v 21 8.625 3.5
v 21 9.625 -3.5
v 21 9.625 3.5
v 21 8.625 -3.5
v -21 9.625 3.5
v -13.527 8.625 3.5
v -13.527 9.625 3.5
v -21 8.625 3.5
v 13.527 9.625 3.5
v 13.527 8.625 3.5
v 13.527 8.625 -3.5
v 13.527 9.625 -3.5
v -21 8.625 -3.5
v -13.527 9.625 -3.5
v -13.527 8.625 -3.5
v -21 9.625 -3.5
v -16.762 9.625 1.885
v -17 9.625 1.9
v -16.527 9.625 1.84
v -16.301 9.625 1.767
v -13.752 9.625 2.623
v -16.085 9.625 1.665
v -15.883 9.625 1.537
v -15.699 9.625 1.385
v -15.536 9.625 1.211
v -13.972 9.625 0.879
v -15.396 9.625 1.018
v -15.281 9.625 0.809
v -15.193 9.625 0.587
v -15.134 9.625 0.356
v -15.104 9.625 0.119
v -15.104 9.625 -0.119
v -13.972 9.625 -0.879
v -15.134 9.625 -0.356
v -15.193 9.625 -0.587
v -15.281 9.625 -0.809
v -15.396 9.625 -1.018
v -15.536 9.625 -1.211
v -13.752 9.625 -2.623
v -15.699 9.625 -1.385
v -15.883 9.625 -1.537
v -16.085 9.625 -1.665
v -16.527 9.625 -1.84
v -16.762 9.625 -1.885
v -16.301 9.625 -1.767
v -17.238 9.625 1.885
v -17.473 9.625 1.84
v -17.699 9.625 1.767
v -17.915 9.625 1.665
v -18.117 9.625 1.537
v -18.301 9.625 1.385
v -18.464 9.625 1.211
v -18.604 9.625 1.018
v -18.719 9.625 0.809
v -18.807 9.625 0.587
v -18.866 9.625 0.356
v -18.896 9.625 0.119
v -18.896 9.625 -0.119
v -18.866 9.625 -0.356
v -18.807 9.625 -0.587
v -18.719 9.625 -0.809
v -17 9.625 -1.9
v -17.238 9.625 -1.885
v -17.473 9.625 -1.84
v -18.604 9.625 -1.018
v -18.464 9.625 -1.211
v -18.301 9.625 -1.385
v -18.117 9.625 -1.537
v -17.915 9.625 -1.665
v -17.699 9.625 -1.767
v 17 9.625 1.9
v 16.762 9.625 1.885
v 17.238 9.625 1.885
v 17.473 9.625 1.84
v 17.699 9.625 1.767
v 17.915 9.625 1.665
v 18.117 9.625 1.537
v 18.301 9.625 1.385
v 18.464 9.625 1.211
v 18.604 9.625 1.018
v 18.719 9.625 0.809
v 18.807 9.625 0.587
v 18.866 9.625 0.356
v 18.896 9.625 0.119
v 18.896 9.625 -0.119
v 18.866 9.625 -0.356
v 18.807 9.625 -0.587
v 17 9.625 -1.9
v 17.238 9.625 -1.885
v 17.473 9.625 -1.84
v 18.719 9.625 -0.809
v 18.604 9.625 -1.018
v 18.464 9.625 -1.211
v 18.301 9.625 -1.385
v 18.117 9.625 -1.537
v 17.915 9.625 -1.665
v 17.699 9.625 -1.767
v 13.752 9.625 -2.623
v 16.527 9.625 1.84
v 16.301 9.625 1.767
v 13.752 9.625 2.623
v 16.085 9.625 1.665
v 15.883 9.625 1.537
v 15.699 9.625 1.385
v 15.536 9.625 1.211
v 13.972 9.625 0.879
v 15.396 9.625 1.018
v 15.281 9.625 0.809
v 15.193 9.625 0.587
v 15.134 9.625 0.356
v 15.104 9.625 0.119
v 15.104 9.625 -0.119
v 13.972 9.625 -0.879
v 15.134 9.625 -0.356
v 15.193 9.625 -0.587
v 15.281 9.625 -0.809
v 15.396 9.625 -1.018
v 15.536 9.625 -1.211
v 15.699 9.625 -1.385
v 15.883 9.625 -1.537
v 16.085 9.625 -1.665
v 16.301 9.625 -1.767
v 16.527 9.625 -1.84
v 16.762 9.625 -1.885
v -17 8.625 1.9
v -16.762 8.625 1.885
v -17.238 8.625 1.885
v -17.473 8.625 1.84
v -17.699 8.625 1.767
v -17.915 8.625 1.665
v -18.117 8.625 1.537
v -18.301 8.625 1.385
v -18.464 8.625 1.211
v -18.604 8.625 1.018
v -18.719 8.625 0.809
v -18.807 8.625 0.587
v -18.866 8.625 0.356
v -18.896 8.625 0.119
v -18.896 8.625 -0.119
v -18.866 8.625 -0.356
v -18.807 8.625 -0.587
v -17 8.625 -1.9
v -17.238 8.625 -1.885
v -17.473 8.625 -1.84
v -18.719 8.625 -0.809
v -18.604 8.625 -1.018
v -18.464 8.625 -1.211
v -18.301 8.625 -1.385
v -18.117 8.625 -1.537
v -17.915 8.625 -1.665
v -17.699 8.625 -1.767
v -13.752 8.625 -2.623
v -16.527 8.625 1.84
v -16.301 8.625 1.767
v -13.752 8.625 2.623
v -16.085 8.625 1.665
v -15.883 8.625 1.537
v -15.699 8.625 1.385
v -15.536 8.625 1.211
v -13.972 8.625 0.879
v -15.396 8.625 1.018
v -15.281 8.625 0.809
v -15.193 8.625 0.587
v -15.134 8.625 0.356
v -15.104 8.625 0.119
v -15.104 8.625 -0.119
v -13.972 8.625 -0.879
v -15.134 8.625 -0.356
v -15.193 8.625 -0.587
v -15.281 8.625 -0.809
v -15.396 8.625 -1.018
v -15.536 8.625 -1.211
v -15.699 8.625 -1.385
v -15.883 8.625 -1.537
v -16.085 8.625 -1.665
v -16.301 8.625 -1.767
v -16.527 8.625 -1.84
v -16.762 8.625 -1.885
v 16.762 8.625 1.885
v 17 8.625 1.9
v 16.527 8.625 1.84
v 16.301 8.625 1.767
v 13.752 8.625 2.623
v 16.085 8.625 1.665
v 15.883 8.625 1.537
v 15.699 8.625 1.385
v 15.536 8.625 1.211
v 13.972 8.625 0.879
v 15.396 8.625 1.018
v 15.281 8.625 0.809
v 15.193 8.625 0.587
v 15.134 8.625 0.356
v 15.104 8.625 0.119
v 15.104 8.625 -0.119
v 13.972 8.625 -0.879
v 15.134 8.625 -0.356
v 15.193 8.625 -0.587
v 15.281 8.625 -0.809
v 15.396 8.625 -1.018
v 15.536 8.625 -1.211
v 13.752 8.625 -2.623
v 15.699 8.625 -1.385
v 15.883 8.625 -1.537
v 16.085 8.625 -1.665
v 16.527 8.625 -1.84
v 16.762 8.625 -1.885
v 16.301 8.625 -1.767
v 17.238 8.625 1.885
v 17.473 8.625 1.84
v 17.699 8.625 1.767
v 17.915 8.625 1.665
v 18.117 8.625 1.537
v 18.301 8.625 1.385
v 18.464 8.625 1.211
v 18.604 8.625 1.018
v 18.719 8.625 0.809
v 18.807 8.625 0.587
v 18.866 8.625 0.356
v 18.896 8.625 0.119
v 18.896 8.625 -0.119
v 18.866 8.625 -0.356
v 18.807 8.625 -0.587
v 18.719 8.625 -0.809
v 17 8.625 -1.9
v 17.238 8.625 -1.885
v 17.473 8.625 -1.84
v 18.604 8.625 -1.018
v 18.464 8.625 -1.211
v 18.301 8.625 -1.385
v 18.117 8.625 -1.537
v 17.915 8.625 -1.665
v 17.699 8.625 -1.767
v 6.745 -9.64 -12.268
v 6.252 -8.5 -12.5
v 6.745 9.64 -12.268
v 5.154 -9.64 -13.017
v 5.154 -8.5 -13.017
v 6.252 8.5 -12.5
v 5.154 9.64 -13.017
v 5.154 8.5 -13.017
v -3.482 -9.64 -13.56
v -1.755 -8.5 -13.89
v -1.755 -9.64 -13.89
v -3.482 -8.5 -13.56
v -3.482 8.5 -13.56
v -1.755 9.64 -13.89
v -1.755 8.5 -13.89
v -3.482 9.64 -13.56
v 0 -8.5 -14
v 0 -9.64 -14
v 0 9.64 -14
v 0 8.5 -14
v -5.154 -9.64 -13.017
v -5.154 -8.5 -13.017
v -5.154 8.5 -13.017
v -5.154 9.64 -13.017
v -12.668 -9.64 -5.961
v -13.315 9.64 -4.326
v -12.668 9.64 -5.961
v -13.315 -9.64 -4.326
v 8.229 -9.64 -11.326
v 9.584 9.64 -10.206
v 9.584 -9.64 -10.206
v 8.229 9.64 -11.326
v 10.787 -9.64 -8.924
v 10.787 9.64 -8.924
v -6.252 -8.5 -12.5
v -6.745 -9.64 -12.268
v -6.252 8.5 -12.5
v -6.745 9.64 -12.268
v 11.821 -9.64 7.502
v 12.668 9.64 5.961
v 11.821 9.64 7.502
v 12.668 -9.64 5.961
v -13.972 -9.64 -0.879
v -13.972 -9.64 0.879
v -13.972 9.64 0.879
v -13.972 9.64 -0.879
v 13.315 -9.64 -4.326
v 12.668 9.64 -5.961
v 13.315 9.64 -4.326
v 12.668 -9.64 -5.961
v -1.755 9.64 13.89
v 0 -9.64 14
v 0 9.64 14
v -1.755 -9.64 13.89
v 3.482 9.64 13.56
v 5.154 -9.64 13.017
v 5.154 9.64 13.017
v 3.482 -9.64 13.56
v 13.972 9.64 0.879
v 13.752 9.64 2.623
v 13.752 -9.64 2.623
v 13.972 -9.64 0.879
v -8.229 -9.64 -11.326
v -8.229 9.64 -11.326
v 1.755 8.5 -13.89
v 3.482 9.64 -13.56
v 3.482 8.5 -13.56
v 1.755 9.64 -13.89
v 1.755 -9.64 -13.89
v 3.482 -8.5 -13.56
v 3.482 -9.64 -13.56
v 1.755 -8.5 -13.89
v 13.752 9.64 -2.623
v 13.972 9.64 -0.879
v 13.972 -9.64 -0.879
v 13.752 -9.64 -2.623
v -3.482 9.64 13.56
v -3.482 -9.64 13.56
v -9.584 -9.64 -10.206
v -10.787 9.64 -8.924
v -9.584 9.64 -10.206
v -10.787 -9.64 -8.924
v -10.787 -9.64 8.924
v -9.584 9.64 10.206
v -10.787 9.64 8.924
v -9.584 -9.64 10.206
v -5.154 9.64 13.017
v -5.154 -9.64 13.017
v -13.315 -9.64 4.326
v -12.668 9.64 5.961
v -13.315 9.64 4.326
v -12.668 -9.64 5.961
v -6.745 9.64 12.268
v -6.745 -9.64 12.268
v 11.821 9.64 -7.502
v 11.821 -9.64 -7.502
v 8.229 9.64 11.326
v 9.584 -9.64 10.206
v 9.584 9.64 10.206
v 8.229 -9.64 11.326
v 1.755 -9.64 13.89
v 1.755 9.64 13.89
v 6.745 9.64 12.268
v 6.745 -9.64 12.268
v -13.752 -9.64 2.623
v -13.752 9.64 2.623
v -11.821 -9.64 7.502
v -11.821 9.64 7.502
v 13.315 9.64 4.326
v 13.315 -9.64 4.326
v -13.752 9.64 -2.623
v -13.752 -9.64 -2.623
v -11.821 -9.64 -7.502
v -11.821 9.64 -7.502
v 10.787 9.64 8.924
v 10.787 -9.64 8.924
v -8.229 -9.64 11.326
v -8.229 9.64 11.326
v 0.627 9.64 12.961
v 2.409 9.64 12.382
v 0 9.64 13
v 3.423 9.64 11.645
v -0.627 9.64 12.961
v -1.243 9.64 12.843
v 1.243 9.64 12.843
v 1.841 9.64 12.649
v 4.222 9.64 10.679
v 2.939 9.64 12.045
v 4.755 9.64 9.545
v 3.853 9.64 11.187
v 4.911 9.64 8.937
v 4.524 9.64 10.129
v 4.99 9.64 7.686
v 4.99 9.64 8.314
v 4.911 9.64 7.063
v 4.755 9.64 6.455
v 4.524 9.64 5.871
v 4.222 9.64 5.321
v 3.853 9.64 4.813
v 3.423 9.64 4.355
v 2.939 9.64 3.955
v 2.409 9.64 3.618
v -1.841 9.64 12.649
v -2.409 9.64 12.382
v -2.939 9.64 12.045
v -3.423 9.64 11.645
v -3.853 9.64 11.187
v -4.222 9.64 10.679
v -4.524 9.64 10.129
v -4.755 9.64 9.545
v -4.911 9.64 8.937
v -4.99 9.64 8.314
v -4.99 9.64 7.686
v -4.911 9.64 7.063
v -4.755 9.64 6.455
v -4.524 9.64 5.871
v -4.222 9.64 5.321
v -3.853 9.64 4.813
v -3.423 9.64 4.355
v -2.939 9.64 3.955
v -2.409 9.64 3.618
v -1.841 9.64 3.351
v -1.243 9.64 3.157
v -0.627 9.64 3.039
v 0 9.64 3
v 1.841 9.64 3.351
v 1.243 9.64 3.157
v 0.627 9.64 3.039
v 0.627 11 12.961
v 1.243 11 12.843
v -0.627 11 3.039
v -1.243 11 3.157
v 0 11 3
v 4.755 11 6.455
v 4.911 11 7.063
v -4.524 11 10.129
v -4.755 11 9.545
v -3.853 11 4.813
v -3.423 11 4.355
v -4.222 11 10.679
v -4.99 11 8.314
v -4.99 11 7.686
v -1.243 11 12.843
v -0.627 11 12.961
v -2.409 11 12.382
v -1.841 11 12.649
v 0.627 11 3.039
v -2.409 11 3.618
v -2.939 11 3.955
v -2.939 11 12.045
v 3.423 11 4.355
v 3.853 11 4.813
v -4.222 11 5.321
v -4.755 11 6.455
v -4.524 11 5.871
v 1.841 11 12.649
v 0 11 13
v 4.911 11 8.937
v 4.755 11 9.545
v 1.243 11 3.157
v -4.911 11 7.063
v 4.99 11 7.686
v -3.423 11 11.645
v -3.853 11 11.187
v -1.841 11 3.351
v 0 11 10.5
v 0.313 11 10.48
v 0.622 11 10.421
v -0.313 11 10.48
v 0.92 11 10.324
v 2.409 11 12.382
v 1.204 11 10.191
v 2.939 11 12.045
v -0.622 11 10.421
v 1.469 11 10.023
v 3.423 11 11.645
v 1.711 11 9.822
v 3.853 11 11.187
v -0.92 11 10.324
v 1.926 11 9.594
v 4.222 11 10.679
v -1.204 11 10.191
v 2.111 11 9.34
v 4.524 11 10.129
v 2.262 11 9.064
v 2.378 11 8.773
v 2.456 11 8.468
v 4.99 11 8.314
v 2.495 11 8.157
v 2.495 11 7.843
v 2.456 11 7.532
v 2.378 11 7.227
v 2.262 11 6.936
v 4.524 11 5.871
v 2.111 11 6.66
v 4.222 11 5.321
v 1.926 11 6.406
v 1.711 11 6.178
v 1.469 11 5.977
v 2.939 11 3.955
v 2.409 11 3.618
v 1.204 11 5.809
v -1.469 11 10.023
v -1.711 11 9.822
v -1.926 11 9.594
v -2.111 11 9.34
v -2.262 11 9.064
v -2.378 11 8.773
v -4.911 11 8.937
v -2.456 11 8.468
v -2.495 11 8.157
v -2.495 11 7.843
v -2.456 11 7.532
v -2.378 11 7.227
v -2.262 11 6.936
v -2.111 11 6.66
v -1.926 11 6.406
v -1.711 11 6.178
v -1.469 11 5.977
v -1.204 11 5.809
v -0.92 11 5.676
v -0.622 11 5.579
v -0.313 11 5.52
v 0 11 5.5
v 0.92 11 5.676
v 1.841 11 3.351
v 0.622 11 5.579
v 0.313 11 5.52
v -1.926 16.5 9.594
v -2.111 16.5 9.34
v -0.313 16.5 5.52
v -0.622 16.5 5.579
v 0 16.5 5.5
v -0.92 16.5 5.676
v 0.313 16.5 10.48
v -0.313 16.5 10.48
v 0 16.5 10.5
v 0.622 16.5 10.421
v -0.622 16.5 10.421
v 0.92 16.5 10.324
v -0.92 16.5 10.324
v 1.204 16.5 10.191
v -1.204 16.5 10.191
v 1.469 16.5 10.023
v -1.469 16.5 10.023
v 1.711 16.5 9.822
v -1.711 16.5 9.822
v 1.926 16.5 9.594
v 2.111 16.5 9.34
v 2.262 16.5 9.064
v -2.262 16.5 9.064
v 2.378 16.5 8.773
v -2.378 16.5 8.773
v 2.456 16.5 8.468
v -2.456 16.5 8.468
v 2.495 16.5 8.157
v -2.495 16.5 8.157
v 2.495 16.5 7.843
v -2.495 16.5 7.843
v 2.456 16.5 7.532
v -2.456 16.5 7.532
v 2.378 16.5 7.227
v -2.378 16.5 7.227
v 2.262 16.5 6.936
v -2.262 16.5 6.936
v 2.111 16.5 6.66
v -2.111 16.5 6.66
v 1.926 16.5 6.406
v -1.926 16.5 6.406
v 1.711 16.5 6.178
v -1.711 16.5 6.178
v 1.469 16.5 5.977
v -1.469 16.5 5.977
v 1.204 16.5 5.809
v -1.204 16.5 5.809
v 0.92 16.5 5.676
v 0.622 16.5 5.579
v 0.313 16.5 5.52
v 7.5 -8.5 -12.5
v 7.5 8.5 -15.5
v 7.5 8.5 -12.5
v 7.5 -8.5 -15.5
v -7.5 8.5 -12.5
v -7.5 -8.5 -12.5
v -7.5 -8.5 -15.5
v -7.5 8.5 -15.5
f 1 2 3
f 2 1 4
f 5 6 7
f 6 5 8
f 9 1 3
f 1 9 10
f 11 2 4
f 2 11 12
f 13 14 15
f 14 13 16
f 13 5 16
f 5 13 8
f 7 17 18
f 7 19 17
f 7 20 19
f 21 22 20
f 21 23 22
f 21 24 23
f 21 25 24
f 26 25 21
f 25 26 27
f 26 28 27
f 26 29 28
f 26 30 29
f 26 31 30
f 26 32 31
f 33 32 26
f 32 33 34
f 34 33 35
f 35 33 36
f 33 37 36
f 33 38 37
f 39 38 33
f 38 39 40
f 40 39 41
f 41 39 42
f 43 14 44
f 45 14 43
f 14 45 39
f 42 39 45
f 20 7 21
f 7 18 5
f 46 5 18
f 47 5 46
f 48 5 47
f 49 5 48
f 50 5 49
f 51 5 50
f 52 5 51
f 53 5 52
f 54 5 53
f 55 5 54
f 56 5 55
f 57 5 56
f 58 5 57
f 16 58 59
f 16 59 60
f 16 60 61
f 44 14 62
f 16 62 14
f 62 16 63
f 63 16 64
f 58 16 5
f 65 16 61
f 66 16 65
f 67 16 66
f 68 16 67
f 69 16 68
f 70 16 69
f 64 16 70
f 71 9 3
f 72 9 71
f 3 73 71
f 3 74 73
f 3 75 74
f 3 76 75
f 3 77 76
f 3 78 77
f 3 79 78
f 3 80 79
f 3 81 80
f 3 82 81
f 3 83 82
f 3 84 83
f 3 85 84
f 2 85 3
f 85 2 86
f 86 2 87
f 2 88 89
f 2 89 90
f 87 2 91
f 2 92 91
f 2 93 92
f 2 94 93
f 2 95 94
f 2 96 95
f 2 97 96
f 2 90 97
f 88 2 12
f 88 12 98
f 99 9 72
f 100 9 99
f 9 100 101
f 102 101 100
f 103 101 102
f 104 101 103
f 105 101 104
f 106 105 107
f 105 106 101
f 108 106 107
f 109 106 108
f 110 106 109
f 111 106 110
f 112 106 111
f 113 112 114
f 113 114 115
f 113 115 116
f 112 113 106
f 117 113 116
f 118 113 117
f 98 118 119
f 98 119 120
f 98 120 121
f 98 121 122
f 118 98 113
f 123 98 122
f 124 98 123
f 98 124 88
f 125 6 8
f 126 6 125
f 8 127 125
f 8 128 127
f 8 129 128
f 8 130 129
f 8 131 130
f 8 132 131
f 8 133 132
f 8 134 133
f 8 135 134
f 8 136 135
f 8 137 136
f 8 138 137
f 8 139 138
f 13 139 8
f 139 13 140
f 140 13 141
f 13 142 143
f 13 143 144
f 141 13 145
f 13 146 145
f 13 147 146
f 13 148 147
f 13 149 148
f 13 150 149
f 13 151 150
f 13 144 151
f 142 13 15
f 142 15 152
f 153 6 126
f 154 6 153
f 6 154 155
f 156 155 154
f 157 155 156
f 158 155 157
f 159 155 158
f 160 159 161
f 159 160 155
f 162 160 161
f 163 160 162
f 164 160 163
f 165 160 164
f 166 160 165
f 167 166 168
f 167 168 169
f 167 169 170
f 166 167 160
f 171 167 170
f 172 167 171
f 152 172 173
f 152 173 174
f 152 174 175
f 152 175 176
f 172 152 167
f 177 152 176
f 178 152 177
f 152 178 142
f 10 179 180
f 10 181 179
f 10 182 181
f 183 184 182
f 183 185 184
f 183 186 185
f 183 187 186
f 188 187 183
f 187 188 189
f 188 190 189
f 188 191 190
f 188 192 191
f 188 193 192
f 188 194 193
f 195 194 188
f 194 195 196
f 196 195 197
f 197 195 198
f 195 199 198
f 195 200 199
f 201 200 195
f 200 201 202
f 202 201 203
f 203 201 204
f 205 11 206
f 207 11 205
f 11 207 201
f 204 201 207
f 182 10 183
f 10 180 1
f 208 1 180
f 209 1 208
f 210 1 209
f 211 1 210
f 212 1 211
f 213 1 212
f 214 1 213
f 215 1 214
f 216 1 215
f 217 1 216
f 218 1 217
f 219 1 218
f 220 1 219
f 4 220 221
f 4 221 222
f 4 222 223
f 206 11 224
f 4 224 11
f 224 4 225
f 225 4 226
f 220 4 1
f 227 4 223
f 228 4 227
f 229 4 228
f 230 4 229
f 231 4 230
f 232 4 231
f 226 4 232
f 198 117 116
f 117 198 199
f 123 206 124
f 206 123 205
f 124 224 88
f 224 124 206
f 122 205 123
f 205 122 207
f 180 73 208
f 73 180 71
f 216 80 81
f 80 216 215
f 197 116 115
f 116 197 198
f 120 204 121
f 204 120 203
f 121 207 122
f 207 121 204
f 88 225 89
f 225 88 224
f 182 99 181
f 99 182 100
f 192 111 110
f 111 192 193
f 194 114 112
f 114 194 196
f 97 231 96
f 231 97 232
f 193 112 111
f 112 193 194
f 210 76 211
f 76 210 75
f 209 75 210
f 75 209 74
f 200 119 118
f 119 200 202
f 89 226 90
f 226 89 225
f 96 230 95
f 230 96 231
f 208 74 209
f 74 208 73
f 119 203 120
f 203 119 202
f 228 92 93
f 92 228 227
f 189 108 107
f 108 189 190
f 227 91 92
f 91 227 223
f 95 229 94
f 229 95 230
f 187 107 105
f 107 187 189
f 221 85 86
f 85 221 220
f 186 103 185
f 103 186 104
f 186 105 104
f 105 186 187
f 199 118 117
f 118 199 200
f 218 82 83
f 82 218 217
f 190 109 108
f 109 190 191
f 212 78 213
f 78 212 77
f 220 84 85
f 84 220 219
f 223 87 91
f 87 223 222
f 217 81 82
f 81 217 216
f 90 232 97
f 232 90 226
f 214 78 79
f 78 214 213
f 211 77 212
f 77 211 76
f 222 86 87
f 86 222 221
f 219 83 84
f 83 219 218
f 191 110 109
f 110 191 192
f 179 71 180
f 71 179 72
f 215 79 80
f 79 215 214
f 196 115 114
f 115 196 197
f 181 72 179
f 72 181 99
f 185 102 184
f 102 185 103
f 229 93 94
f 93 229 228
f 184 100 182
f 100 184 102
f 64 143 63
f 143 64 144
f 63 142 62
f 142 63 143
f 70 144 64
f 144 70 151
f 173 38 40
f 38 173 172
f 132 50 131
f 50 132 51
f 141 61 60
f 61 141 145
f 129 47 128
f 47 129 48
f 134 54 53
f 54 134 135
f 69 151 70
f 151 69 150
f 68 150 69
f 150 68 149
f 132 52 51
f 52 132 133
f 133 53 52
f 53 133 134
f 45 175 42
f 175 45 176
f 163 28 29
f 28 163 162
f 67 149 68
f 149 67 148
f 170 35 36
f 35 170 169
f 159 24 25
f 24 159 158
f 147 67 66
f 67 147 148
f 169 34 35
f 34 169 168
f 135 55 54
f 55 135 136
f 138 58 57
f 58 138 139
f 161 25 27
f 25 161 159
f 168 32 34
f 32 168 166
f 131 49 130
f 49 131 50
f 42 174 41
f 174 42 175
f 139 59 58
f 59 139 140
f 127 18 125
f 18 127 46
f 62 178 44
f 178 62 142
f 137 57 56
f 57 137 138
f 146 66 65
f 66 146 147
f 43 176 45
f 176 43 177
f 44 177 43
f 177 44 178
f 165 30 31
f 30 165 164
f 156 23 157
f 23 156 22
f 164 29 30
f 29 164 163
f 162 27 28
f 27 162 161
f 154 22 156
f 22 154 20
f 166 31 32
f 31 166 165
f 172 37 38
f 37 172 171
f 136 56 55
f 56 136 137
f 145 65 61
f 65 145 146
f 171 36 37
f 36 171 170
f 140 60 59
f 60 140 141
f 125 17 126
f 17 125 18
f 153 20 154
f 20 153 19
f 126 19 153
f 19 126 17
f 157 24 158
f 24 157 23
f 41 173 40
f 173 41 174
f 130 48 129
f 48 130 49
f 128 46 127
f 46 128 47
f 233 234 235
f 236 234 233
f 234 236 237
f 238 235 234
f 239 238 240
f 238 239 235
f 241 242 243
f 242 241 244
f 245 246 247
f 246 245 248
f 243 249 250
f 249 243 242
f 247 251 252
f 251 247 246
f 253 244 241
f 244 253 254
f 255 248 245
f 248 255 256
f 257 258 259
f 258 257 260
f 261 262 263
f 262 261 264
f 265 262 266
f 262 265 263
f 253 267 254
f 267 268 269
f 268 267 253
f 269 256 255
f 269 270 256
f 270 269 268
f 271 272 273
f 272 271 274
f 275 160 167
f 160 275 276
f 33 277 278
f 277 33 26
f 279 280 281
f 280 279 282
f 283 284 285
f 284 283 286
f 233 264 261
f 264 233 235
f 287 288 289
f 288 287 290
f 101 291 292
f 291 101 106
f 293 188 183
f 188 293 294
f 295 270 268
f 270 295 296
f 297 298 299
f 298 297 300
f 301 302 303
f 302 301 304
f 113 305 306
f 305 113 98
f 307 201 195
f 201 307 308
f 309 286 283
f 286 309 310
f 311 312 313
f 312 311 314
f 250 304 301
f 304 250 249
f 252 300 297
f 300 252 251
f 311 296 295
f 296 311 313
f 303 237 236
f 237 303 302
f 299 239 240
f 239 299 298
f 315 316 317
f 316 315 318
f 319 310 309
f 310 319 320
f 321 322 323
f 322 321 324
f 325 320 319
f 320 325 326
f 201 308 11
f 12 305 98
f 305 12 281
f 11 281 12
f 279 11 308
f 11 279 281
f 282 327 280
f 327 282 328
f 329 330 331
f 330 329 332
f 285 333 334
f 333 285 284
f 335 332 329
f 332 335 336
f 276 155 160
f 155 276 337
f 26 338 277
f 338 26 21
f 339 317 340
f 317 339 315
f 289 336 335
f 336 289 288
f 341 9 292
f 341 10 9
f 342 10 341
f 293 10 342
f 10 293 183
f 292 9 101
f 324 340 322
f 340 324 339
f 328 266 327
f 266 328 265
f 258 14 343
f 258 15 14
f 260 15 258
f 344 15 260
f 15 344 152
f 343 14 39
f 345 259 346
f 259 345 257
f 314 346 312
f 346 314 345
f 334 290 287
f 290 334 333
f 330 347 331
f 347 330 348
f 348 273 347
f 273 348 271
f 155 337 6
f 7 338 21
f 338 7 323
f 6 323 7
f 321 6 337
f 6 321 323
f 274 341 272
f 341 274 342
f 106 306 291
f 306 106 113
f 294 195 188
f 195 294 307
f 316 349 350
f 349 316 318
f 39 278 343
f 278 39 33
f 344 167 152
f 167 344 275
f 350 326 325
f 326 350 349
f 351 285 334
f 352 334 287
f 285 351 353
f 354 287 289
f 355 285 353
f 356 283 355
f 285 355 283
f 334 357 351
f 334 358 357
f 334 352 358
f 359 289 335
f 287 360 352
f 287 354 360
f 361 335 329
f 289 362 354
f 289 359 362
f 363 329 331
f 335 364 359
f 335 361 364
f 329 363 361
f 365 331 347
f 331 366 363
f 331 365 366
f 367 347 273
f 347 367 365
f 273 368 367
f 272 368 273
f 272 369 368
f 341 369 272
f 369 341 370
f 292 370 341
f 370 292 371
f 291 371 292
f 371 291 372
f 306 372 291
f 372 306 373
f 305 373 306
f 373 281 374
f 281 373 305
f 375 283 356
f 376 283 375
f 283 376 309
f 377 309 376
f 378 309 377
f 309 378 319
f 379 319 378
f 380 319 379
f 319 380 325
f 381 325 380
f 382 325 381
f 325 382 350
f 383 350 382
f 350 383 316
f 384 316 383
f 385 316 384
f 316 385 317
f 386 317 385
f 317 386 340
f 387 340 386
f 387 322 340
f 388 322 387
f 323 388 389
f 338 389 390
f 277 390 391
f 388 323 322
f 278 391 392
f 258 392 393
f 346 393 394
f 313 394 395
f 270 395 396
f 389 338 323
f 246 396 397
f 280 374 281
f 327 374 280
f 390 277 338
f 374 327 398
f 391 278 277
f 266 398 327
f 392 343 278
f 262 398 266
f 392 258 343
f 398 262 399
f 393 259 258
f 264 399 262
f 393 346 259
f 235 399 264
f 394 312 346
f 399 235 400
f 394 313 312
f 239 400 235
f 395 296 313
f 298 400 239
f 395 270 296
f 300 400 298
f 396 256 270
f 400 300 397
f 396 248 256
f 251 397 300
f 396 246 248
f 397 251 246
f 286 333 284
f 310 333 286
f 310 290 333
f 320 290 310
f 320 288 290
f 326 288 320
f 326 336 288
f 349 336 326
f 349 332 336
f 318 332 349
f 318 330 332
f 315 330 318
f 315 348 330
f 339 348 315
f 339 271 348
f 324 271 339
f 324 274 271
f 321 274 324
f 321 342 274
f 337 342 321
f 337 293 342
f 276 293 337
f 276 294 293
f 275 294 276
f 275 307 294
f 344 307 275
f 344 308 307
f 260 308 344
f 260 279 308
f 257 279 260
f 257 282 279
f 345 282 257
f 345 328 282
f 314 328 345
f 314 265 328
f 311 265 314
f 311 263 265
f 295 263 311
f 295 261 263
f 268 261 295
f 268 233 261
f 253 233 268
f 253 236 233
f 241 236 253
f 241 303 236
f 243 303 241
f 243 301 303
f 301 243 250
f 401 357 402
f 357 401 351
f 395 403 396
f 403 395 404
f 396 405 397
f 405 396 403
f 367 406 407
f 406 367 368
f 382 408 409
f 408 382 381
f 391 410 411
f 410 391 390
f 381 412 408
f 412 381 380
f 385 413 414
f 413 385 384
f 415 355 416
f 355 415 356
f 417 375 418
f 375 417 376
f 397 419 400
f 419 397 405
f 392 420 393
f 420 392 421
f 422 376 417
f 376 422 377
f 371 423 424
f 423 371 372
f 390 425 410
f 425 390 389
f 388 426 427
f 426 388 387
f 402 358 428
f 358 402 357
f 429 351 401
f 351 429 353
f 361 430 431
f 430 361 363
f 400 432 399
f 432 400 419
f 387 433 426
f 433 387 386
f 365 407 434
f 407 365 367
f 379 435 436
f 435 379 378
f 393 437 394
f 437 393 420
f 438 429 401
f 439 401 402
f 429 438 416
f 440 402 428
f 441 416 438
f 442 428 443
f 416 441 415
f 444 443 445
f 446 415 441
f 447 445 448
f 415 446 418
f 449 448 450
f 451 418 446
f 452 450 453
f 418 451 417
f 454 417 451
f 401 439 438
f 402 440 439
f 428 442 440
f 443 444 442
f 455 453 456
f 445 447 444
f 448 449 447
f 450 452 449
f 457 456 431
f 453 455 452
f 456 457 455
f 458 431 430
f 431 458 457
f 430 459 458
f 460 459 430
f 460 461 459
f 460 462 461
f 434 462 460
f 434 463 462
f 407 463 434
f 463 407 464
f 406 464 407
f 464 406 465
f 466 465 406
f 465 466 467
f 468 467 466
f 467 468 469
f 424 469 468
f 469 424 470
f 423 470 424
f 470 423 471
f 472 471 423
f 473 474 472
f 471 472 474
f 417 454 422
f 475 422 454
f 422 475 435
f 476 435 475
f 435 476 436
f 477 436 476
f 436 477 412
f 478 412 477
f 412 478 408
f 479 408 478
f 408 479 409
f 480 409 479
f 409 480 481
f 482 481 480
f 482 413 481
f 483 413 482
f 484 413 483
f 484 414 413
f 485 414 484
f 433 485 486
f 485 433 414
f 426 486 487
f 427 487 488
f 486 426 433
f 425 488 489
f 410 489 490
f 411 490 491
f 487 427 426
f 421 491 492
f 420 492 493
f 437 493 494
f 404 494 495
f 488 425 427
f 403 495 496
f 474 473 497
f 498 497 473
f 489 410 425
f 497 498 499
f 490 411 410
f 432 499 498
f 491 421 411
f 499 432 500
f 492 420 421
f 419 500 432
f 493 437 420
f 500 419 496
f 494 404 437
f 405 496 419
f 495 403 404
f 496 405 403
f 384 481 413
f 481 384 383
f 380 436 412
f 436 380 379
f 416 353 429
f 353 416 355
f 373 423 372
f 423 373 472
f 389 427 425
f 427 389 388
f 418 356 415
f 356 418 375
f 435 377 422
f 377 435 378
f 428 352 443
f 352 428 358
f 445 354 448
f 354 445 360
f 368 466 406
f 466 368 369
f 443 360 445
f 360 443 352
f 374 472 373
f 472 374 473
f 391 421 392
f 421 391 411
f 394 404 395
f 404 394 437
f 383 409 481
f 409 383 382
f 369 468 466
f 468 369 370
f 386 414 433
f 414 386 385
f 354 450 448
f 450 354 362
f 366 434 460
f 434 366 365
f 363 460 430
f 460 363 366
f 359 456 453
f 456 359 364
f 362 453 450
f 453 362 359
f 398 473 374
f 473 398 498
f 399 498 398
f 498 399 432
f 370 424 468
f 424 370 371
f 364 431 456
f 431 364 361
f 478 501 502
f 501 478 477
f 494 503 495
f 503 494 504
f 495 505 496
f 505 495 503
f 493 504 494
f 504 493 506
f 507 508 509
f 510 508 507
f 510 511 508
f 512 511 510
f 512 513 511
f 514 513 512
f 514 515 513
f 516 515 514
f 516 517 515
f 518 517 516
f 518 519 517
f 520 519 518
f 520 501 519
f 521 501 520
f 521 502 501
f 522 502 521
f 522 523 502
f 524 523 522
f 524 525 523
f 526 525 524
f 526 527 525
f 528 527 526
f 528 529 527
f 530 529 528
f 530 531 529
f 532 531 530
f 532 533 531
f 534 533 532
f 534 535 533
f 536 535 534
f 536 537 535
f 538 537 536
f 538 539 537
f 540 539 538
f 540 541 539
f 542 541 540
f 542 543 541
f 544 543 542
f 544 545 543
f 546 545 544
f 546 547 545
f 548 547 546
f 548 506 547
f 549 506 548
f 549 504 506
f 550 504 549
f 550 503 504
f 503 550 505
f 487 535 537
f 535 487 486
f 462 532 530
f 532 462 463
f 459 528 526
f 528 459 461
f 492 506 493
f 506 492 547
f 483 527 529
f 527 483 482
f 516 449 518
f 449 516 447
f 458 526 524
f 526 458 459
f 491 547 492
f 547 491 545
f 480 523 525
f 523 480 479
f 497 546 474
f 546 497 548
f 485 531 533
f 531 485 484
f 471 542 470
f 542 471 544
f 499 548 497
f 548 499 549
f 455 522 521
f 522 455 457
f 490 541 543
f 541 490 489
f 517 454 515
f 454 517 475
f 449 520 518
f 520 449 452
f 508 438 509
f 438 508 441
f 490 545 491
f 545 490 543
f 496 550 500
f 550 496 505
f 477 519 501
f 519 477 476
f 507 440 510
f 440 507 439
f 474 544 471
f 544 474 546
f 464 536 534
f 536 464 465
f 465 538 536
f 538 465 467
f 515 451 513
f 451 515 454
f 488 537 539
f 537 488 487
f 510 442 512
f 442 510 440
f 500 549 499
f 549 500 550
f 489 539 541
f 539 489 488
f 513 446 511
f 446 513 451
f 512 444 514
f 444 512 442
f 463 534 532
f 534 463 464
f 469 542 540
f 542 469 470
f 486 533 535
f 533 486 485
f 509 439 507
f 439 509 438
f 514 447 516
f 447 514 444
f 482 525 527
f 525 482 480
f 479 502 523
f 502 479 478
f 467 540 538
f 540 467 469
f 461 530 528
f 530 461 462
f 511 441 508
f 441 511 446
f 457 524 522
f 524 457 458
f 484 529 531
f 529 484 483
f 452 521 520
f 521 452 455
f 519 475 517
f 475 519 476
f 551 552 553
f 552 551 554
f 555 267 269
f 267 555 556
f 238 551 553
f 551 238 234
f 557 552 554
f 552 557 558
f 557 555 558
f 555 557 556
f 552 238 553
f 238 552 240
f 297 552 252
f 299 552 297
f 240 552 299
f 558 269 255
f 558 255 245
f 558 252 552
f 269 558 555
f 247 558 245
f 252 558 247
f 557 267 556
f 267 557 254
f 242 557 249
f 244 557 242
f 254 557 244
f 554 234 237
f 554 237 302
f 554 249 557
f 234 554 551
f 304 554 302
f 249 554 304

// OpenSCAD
module mechanical_StepperMotor(){
	//mainBody
	translate([0,0,]) rotate([0,90,90]) cylinder(r=14,h=19.28,$fn=50,center=true);
	//shaftCollar
	translate([0,10,8]) rotate([0,90,90]) cylinder(r=5,h=2,$fn=50,center=true);
	//shaft
	translate([0,12,8]) rotate([0,90,90]) color([.9,.8,.0]) cylinder(r=2.5,h=9,$fn=50,center=true);
	//wireBlock
	translate([0,0,-14]) color([.0,.5,.9]) cube(size=[15,17,3],center=true);
	//mountingBracket
	difference(){
		//bracketTabs
		translate([0,9.125,0]) cube(size=[42,1,7],center=true);
		//screwHoles
		translate([17,10,0]) rotate([0,90,90]) cylinder(r=1.9,h=4,$fn=50,center=true);
		translate([-17,10,0]) rotate([0,90,90]) cylinder(r=1.9,h=4,$fn=50,center=true);
	}
}

translate([0,0,0]){
	mechanical_StepperMotor();
}
